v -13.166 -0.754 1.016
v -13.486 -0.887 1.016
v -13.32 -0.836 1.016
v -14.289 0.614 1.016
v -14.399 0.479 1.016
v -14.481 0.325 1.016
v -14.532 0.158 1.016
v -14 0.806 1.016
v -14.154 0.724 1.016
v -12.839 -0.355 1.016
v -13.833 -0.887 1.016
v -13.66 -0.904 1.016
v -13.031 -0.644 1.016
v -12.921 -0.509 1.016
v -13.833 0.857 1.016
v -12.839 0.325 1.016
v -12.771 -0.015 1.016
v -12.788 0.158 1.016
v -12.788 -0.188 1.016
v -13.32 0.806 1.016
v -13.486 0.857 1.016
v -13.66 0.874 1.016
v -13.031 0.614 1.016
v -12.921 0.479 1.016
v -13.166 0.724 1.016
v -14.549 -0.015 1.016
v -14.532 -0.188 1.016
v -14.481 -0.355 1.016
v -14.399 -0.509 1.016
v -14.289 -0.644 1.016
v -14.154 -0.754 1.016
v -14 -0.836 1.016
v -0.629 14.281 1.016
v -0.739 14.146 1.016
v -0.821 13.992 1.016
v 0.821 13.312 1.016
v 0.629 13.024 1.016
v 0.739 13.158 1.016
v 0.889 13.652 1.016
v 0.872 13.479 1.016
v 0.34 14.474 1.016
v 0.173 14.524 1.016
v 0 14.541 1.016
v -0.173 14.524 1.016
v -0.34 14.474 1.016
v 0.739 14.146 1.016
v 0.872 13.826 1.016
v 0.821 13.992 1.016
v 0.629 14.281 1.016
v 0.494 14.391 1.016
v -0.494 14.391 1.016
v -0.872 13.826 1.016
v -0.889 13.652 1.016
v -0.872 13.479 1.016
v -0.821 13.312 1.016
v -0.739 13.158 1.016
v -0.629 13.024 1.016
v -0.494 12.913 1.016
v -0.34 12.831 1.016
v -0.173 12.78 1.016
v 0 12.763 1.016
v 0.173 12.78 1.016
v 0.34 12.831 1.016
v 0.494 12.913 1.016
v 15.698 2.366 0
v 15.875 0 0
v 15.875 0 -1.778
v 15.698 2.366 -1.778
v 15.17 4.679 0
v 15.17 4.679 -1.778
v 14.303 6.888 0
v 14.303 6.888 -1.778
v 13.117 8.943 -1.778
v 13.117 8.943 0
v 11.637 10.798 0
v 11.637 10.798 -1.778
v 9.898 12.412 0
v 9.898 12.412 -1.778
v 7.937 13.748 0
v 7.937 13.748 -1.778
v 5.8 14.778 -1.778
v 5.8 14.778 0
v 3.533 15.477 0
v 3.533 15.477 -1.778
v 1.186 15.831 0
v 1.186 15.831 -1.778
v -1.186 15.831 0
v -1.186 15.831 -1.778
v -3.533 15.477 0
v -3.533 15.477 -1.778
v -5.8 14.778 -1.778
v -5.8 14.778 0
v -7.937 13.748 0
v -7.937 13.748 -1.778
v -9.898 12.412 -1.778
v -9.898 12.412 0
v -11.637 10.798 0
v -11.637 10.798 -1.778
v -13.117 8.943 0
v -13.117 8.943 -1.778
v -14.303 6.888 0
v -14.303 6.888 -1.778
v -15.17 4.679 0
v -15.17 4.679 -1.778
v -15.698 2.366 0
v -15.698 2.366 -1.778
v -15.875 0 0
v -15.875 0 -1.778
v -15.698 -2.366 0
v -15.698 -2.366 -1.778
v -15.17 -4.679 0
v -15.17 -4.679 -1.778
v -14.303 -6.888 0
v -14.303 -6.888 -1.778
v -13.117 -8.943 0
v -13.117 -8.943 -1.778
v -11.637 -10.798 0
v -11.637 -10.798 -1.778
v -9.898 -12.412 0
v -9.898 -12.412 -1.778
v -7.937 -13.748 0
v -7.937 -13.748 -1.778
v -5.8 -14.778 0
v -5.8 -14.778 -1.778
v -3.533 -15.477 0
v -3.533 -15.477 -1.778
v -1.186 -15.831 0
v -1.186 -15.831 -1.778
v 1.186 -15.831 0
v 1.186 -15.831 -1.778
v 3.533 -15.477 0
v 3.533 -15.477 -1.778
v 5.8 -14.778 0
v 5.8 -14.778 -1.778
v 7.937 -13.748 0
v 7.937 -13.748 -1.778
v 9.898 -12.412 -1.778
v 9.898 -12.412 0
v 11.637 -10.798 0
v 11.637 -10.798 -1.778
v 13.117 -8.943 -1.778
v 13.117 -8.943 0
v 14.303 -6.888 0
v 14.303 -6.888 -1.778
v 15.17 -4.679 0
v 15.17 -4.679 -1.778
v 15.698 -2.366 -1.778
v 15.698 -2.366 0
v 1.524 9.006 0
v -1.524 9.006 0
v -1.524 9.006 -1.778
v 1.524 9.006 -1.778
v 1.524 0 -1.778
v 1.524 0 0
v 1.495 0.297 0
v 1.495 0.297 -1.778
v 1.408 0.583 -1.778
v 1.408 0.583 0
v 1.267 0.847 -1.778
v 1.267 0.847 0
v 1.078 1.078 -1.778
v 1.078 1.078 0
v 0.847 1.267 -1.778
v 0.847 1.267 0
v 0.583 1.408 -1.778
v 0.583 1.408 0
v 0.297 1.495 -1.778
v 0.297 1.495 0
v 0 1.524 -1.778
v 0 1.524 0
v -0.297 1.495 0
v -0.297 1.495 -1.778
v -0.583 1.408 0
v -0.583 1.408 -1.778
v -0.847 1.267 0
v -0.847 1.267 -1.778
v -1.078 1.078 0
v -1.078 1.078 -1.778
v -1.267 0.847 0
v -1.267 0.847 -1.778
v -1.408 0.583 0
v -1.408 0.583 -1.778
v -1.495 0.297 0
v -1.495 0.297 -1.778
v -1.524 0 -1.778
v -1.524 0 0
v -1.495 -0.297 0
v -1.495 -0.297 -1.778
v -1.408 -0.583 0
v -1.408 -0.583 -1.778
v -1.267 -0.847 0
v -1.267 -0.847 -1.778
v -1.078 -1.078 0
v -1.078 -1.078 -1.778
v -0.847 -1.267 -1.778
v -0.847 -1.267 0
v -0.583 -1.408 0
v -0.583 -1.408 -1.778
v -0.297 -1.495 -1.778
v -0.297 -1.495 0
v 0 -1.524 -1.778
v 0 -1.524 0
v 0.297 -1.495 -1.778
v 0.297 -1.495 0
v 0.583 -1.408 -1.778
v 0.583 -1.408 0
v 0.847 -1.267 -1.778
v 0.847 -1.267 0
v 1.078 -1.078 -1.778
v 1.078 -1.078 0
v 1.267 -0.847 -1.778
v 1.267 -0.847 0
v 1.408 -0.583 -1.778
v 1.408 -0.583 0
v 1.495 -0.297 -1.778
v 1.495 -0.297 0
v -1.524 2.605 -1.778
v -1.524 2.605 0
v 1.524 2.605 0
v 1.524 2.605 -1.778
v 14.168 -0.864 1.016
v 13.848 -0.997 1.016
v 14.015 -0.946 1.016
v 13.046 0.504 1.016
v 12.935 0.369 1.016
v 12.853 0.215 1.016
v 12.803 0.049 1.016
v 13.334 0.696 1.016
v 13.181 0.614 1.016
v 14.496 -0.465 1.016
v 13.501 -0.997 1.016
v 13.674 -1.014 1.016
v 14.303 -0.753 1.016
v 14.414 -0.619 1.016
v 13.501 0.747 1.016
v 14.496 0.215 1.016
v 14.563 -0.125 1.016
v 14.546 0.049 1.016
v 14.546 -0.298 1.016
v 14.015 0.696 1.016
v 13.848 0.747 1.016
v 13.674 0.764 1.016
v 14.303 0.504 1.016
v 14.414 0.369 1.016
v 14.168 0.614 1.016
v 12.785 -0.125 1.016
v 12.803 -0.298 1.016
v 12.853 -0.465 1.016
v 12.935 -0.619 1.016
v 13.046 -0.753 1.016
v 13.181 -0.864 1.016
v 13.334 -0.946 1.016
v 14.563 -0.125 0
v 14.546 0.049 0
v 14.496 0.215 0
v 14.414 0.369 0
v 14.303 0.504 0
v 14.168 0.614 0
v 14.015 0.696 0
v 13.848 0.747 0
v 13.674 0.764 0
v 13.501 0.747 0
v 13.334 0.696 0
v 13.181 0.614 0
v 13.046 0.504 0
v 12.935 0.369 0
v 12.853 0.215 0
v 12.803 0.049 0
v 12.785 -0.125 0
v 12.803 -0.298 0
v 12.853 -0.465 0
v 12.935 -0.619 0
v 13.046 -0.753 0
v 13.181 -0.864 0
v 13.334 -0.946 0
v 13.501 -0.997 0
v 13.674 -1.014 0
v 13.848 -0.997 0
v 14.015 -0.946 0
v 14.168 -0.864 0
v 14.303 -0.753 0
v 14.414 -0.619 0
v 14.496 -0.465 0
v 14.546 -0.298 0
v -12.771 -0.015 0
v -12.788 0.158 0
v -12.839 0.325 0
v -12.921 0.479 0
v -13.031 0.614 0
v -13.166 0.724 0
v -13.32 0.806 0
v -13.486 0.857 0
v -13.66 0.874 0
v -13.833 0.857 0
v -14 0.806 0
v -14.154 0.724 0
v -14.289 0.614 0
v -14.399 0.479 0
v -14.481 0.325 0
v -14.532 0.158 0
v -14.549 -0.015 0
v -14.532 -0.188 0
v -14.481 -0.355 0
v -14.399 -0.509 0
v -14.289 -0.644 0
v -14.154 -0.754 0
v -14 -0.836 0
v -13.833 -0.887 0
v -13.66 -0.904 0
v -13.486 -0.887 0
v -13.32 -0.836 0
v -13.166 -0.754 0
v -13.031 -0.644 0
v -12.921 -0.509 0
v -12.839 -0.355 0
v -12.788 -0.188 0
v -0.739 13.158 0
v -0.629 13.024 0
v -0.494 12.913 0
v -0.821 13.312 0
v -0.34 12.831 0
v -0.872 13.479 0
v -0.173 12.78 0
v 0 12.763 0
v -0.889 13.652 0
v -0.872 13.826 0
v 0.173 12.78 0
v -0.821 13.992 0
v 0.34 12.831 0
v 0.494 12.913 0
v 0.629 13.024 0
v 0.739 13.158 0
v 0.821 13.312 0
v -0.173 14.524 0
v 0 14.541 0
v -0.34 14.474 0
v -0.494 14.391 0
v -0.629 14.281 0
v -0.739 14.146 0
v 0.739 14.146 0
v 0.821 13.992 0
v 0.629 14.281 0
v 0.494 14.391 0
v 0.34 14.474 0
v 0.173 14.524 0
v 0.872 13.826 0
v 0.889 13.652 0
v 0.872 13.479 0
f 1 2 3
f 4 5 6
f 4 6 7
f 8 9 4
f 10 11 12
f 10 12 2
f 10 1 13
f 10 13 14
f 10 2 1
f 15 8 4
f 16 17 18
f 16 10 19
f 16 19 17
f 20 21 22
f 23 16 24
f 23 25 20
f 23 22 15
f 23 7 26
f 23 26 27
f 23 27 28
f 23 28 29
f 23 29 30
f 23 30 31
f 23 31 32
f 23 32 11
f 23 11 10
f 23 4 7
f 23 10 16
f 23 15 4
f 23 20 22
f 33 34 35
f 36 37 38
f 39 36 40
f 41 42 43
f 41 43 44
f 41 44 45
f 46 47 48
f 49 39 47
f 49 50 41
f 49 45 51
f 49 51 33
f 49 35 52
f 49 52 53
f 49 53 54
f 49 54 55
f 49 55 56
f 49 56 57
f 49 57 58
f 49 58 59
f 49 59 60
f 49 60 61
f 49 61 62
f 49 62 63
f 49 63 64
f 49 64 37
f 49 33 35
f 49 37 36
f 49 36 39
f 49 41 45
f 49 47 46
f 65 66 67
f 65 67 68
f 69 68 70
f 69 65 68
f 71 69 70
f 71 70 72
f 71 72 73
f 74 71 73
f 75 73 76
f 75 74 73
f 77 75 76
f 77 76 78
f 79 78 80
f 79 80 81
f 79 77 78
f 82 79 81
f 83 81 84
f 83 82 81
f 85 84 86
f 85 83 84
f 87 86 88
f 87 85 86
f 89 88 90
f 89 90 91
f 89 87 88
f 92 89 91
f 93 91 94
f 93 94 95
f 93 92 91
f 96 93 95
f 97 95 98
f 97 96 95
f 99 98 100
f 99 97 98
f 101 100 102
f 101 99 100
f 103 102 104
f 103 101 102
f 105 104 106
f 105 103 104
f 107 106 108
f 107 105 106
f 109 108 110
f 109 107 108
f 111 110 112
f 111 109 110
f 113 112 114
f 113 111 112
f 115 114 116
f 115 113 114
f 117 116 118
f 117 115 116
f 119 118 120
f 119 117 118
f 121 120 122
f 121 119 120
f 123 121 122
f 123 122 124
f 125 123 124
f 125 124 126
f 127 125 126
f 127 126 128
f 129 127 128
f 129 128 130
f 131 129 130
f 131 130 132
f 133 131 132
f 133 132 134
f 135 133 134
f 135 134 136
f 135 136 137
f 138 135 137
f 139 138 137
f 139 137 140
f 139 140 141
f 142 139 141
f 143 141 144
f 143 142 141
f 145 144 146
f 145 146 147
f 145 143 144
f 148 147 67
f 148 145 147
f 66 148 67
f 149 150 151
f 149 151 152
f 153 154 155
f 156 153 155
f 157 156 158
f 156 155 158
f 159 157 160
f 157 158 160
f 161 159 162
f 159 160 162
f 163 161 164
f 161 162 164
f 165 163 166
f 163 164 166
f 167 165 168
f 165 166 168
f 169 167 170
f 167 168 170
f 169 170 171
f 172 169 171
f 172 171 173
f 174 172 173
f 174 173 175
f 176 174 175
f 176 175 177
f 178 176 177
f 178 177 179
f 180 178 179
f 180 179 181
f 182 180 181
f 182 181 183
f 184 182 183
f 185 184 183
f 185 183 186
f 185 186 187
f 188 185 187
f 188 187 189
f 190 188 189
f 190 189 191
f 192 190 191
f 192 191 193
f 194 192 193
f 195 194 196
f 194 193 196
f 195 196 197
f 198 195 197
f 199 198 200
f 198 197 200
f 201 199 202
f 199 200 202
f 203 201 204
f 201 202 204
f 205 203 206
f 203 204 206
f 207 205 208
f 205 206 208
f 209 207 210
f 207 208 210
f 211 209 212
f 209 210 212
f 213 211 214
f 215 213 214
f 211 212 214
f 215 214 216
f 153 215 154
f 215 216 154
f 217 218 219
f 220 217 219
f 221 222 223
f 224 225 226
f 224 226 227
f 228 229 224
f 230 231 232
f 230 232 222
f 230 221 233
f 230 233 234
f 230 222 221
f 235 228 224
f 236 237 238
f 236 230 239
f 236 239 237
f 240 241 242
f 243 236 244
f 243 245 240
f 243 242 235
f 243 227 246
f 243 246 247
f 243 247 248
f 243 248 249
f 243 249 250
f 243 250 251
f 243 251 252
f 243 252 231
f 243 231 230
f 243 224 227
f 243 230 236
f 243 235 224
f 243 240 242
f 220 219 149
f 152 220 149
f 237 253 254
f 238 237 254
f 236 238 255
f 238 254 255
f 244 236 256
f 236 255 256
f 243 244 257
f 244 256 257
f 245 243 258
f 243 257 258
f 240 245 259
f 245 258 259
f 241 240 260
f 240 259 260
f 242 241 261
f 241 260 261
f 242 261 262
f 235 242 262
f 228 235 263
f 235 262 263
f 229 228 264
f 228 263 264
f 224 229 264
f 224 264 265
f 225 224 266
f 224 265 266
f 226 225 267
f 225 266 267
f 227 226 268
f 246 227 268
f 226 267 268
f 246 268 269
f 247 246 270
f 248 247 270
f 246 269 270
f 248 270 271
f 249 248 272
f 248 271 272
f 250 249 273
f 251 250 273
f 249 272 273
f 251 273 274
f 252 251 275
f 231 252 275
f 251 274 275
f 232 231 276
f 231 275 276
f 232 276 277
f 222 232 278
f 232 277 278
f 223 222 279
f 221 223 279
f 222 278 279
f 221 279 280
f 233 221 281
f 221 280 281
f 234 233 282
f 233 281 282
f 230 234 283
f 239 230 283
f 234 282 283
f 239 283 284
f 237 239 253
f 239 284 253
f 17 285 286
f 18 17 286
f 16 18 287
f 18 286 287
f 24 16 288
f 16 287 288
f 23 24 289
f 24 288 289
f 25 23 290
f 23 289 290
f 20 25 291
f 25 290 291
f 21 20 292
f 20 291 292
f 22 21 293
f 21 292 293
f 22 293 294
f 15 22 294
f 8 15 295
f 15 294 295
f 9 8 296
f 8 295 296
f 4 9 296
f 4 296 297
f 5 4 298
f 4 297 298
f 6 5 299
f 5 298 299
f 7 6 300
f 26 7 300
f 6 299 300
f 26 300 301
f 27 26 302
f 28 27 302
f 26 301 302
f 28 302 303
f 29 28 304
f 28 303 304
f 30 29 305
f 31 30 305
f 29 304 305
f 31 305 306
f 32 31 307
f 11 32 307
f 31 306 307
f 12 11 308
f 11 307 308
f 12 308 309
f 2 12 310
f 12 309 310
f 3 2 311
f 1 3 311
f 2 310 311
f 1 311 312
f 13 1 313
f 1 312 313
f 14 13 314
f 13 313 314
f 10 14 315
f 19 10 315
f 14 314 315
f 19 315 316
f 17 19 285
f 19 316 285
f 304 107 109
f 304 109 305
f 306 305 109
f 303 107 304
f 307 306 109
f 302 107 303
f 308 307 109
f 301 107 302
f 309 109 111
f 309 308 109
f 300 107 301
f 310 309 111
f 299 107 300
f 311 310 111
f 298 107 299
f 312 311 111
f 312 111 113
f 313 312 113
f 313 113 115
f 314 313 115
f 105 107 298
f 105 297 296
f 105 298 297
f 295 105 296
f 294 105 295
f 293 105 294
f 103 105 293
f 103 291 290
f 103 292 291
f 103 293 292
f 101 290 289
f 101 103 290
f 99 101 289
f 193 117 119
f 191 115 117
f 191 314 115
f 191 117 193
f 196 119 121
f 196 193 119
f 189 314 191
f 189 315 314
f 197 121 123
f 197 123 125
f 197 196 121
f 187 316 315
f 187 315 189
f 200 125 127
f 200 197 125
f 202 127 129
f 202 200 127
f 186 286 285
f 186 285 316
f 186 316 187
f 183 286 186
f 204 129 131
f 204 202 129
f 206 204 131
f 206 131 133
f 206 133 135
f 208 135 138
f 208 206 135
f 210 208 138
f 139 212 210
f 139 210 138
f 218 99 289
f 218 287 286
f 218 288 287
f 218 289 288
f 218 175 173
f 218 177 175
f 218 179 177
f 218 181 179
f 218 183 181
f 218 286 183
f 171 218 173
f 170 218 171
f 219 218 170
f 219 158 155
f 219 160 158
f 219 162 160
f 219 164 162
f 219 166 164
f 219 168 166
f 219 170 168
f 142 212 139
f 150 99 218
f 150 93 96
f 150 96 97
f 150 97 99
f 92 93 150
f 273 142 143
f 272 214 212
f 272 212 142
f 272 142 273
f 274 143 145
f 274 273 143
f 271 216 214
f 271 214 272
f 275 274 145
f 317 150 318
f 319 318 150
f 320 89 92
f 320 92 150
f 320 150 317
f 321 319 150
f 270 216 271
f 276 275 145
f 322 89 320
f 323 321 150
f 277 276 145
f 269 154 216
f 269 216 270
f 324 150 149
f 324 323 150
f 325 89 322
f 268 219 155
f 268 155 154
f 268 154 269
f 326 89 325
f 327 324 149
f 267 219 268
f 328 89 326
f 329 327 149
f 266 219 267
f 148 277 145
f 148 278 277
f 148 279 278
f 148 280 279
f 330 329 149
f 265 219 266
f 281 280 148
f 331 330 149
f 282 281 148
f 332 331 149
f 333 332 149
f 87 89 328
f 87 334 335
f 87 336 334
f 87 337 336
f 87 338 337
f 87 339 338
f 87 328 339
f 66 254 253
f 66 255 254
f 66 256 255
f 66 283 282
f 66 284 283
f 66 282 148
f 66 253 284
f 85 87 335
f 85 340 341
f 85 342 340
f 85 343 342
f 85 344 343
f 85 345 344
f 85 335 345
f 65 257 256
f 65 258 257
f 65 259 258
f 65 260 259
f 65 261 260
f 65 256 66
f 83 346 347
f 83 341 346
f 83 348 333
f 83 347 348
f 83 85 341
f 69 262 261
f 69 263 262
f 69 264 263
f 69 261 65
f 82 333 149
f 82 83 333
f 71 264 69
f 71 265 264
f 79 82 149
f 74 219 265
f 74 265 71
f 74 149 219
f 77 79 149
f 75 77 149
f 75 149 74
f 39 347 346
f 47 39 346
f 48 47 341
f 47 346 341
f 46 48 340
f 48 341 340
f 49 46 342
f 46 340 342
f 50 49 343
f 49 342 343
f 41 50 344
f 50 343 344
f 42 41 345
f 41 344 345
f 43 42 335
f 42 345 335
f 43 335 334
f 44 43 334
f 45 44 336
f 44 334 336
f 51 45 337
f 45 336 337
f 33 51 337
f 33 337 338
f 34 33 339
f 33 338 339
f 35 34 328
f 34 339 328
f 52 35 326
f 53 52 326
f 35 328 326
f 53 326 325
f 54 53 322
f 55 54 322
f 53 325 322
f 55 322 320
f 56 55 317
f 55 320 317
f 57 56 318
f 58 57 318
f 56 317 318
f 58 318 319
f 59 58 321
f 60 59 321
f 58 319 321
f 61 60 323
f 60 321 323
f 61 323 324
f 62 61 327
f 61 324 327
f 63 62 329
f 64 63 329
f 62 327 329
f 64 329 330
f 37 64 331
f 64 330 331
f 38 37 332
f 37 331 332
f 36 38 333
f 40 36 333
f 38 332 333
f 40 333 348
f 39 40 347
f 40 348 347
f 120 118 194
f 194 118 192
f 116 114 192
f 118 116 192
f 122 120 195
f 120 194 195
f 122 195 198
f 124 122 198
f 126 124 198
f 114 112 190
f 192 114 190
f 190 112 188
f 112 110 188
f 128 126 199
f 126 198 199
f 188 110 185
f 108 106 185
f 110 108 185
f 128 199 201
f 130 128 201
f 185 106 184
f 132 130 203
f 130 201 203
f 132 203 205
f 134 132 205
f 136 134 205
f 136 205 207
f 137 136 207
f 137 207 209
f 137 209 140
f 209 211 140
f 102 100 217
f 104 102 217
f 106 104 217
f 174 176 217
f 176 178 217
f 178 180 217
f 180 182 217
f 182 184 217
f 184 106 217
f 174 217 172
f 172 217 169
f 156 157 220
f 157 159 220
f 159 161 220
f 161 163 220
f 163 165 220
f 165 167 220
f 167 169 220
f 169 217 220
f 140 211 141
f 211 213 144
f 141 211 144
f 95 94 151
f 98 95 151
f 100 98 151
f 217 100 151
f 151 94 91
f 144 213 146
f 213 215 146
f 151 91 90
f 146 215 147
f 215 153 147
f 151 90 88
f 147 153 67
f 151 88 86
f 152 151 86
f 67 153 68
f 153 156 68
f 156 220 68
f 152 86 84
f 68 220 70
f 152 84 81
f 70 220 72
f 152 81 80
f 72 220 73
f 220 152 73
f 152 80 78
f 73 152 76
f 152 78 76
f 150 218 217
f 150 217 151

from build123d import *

# Parameters (mm, degrees)
F0_R     = 15.875
F1_DEPTH = 1.778
F3_R     = 0.889
F4_DEPTH = 1.016
F5_R     = 1.524
F5_W     = 3.048
F5_H     = 6.400035
F6_DEPTH = 2.22015


with BuildPart() as f1:
    # F0 (on Top) → F1 (new body)
    with BuildSketch(Plane.XY):
        Circle(F0_R)
    extrude(amount=-F1_DEPTH)

    # F3 (on face) → F4 (join)
    with BuildSketch(Plane.XY):
        with Locations((0, 13.652203)):
            Circle(F3_R)
        with Locations((-13.659894, -0.015021)):
            Circle(F3_R)
        with Locations((13.674476, -0.124876)):
            Circle(F3_R)
    extrude(amount=F4_DEPTH)

    # F5 (on face) → F6 (cut)
    with BuildSketch(Plane.XY):
        Circle(F5_R)
        with Locations((0, 5.805492)):
            Rectangle(F5_W, F5_H)
    extrude(amount=-F6_DEPTH, mode=Mode.SUBTRACT)


solid = f1.part
